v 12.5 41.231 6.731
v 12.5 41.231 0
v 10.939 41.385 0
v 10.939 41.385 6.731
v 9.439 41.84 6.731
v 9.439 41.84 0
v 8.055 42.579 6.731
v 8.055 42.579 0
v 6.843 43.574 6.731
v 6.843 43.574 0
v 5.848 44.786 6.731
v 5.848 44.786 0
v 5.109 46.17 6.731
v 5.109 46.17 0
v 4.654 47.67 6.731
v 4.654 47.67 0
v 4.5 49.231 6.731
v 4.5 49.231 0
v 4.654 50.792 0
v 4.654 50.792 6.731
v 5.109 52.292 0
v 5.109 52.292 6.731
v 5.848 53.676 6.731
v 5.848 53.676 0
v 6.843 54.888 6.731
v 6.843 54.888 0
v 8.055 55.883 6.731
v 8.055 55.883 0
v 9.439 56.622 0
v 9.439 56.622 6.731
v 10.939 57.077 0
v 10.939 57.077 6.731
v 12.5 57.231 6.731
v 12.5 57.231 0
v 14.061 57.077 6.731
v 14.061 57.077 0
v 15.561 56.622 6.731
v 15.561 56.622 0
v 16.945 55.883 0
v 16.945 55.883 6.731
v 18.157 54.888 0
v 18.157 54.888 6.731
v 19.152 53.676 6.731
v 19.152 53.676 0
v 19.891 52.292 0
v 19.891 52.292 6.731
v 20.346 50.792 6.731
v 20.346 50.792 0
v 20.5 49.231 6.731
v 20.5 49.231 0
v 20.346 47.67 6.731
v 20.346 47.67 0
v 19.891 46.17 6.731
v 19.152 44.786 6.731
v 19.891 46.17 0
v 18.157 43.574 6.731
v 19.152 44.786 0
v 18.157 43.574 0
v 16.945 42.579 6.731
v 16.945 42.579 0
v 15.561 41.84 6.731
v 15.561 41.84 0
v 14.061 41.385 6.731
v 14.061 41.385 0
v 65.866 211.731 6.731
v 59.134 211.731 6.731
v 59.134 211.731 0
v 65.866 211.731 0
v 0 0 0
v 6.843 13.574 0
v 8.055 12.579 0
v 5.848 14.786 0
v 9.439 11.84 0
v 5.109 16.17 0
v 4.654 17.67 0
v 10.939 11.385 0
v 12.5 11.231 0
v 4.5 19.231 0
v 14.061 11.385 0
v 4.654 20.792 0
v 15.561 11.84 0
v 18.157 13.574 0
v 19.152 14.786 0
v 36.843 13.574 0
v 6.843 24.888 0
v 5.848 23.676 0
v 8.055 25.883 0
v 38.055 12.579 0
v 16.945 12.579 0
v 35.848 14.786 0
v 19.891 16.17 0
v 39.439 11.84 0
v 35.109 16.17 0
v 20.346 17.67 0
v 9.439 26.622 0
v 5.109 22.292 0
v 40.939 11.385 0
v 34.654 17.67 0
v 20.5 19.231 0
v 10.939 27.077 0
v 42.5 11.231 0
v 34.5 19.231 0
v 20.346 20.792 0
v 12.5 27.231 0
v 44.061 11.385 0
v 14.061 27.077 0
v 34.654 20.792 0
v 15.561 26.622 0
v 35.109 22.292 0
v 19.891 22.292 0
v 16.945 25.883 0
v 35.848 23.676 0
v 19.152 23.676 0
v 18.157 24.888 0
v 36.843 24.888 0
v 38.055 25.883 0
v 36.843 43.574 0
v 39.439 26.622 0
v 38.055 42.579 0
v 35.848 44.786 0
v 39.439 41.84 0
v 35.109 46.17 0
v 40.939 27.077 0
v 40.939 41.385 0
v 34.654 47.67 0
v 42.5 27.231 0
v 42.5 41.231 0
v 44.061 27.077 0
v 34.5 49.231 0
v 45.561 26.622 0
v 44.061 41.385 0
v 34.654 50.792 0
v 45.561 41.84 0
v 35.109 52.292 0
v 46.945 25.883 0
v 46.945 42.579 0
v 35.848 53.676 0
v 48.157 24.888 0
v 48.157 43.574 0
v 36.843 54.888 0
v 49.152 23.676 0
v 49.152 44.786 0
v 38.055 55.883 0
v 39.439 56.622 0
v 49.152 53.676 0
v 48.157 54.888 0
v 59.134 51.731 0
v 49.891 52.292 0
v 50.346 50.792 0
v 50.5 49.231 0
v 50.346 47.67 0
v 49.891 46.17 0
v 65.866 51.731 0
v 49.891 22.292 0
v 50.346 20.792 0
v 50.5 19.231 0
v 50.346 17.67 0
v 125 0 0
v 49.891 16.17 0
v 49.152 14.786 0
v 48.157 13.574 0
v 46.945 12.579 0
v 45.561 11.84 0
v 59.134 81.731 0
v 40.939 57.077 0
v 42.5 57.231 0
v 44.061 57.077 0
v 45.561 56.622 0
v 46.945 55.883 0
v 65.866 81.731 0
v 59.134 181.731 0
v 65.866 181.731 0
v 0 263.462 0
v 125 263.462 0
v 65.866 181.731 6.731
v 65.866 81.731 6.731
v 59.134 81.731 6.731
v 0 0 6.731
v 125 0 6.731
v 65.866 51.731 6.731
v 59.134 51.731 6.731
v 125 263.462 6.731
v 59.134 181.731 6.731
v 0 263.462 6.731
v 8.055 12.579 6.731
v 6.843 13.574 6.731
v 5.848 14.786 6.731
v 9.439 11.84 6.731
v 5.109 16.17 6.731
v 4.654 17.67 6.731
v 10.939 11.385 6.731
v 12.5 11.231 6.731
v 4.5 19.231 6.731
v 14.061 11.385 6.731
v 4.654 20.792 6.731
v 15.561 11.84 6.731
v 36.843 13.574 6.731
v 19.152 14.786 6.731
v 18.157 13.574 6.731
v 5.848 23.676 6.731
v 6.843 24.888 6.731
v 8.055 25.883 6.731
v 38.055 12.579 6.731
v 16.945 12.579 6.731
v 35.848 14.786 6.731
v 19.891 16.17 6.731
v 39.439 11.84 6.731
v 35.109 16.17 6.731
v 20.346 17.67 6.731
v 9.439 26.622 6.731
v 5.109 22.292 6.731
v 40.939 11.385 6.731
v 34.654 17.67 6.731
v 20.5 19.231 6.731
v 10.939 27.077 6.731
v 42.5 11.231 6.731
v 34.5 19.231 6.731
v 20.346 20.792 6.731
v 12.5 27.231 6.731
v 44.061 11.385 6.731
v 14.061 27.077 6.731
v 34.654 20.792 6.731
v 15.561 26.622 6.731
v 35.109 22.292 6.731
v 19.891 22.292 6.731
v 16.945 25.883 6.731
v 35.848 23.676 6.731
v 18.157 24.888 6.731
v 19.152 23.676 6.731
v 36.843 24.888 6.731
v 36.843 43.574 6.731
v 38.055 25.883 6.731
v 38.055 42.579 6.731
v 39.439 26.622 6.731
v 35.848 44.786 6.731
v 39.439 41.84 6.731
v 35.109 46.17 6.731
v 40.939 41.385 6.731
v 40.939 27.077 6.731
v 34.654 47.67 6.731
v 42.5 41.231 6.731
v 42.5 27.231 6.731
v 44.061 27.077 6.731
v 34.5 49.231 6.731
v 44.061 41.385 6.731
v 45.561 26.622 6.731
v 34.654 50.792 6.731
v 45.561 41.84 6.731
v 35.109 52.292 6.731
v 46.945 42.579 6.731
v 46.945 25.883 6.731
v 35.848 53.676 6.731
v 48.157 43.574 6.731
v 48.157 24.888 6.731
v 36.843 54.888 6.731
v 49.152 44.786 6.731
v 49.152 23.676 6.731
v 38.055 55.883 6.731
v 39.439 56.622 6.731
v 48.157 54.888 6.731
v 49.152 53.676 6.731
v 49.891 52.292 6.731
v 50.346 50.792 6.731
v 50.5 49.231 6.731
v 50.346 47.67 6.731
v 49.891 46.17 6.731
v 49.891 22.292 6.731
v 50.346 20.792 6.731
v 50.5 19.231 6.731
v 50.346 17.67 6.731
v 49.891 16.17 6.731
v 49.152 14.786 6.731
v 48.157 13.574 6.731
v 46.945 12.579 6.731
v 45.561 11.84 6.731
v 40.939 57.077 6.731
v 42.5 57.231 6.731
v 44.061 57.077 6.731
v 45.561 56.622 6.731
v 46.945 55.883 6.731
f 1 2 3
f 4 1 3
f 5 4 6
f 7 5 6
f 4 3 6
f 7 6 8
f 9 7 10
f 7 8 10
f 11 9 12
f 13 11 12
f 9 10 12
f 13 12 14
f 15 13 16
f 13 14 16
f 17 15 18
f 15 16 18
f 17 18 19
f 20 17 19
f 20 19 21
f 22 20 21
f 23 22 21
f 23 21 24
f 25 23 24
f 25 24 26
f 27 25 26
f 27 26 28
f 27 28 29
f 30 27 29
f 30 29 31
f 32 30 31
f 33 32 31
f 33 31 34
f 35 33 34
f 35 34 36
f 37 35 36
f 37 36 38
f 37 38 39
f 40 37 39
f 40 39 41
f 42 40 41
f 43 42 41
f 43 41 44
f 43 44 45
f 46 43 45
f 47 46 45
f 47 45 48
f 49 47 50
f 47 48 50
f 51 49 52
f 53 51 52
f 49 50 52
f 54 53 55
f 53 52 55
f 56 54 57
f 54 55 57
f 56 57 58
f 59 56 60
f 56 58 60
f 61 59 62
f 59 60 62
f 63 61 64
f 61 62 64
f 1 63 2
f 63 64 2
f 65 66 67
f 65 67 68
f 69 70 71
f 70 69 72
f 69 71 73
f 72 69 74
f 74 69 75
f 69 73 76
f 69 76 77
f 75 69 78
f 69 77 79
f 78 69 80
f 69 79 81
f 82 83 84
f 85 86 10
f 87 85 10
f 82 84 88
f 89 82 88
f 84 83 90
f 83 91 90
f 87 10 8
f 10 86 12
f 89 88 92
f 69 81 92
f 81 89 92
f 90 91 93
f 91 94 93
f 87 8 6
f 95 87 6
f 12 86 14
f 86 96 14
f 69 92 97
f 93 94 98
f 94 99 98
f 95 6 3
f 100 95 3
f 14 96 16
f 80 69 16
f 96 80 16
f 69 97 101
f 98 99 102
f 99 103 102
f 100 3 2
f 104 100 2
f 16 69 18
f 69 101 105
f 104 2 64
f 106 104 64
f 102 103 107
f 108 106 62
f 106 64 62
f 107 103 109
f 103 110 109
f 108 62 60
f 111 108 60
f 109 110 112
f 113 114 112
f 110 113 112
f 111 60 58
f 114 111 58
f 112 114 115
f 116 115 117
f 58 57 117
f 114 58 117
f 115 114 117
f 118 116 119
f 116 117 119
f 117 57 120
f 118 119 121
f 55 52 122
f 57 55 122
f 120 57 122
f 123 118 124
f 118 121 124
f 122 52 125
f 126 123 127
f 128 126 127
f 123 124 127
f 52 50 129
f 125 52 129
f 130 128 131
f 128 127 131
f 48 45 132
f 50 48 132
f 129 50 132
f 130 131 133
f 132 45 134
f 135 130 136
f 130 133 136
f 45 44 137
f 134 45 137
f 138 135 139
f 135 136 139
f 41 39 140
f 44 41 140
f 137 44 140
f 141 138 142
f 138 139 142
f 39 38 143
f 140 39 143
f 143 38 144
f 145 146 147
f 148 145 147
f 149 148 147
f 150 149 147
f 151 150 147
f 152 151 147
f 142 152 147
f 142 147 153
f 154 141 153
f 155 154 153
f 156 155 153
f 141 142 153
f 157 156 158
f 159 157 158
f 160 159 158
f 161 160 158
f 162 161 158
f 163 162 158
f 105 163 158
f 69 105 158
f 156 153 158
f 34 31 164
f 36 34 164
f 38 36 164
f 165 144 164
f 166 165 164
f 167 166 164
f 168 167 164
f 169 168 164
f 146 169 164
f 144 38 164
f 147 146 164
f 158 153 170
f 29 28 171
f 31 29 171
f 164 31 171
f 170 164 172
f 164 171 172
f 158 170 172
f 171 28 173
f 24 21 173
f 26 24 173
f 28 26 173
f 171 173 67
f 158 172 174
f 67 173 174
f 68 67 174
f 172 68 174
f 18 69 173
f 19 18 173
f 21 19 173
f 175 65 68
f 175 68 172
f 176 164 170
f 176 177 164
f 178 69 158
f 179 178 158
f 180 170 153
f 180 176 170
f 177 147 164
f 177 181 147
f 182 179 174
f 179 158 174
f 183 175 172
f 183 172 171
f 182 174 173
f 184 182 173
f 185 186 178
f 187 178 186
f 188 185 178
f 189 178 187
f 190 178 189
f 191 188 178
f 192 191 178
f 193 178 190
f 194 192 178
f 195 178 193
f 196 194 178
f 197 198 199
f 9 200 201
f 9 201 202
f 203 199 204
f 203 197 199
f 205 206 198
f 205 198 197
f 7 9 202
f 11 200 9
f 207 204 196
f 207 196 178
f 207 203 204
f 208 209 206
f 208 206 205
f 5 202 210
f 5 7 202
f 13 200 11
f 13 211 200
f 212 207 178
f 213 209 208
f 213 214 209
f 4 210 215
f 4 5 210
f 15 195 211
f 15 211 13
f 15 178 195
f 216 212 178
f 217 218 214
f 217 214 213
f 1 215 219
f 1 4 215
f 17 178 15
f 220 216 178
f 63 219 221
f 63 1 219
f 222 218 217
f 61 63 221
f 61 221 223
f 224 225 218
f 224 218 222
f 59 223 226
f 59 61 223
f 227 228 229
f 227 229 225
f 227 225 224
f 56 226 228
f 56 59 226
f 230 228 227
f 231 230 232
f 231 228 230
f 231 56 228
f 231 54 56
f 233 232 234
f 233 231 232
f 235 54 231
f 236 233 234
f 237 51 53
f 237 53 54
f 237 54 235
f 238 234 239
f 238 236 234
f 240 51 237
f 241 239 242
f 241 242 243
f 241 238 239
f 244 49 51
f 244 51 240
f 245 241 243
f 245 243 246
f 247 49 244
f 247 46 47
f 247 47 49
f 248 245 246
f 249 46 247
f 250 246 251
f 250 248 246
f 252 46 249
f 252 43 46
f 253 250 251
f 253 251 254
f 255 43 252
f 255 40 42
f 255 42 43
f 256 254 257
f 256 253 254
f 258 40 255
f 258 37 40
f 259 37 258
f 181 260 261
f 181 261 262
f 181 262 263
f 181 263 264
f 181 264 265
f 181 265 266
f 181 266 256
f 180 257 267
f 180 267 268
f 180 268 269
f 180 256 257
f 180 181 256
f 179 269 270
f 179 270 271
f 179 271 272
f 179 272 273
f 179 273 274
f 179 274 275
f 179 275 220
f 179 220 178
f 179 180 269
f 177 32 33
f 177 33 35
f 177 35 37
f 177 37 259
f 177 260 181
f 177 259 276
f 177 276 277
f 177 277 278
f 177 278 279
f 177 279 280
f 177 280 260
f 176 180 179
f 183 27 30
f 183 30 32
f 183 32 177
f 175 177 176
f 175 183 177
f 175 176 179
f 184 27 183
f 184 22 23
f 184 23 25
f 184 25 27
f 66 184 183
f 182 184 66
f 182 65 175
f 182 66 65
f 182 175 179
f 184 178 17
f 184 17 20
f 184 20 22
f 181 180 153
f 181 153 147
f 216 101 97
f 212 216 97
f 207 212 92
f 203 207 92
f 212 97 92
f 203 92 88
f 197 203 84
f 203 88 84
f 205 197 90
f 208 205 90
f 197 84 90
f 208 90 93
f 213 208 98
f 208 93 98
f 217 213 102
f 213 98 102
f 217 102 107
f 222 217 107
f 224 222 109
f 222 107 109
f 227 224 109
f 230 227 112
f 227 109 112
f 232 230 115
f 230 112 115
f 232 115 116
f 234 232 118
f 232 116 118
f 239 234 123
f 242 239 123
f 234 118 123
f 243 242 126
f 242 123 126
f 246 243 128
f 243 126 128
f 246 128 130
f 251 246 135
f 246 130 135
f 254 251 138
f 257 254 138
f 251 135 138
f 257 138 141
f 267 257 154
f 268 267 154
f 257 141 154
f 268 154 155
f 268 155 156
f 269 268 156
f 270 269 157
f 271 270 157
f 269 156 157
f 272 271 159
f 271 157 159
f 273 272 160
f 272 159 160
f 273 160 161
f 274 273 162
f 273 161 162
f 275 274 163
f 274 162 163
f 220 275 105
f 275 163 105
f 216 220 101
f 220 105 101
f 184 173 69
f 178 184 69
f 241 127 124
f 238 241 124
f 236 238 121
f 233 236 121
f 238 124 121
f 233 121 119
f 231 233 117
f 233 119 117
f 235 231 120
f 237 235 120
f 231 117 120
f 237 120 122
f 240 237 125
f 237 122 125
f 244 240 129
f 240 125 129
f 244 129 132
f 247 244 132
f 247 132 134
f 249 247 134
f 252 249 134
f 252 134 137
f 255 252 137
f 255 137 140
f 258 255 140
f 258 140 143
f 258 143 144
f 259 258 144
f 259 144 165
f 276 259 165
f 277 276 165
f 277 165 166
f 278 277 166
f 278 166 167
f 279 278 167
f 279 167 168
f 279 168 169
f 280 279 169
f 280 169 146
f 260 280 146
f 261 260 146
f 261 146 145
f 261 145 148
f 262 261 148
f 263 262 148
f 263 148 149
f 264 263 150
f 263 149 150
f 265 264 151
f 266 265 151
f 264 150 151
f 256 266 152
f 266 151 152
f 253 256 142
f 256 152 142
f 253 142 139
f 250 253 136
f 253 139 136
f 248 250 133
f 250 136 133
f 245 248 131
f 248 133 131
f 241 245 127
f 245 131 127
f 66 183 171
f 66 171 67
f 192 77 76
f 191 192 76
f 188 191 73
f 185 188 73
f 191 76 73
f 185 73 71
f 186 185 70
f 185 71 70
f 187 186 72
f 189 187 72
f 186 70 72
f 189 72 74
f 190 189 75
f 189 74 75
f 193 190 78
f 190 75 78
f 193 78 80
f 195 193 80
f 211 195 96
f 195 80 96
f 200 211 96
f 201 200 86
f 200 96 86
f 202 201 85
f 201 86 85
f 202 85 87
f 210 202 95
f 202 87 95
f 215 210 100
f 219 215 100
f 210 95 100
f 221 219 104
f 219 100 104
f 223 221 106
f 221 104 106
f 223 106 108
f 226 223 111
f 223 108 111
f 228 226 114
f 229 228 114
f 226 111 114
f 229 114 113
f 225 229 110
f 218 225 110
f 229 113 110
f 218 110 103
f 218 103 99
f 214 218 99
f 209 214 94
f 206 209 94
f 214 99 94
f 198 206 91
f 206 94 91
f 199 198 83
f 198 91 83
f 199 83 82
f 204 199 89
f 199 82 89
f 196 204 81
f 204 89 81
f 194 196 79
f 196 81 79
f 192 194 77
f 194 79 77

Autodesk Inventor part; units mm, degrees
ref_plane "YZ Plane" through (0, 0, 0) normal (1, 0, 0) x (0, 1, 0)
ref_plane "XZ Plane" through (0, 0, 0) normal (0, 1, 0) x (-1, 0, 0)
ref_plane "XY Plane" through (0, 0, 0) normal (0, 0, 1) x (1, 0, 0)
sketch "Sketch1" plane through (0, 0, 0) normal (0, 0, 1) x (1, 0, 0)
  line L0 (0, 0) -> (125, 0)
  line L1 (125, 0) -> (125, 263.462)
  line L2 (125, 263.462) -> (0, 263.462)
  line L3 (0, 263.462) -> (0, 0)
  dimension "d0" = 263.462
  dimension "d1" = 125
extrude "Extrusion1" add sketch "Sketch1" along normal blind 6.731
sketch "Sketch2" plane through (0, 0, 6.731) normal (0, 0, 1) x (1, 0, 0)
  line L0 (125, 263.462) -> (0, 263.462) projected
  line L1 (0, 263.462) -> (0, 0) projected
  line L2 (59.1345, 211.731) -> (65.8655, 211.731)
  line L3 (65.8655, 211.731) -> (65.8655, 181.731)
  line L4 (65.8655, 181.731) -> (59.1345, 181.731)
  line L5 (59.1345, 181.731) -> (59.1345, 211.731)
  line L6 (59.1345, 81.731) -> (65.8655, 81.731)
  line L7 (65.8655, 81.731) -> (65.8655, 51.731)
  line L8 (65.8655, 51.731) -> (59.1345, 51.731)
  line L9 (59.1345, 51.731) -> (59.1345, 81.731)
  line L10 (62.5, 81.731) -> (62.5, 181.731) construction
  point P0 (62.5, 131.731)
  point P1 (0, 131.731)
  point P2 (62.5, 263.462)
  dimension "d4" = 30
  dimension "d5" = 100
  dimension "d6" = 6.731
extrude "Extrusion2" cut sketch "Sketch2" against normal up to next
sketch "Sketch3" plane through (0, 0, 6.731) normal (0, 0, 1) x (1, 0, 0)
  line L0 (0, 263.462) -> (0, 0) projected
  line L1 (12.5, 19.231) -> (12.5, 49.231) construction
  line L2 (12.5, 49.231) -> (42.5, 49.231) construction
  line L3 (0, 0) -> (125, 0) projected
  point P0 (42.5, 19.231)
  dimension "d9" = 30
  dimension "d10" = 12.5
  dimension "d18" = 19.231
hole "Hole1" at (12.5, 49.231, 6.731) at (42.5, 49.231, 6.731) at (42.5, 19.231, 6.731) at (12.5, 19.231, 6.731) direction (0, 0, -1) diameter 16 end through all
equation "\"d2\" = THICKB"
equation "\"d6\" = THICKB"
equation "\"d7\" = THICKB"
equation "\"d18\" = THICKB + d10"
equation "\"THICKA\" = 3.175"
equation "\"THICKB\" = 6.731"
equation "\"THICKC\" = 12.7"
equation "\"THICKPLY\" = 5"
equation "\"MAGDIA\" = 9.5"
equation "\"BALLDIA\" = 12"
properties part number "Top"
